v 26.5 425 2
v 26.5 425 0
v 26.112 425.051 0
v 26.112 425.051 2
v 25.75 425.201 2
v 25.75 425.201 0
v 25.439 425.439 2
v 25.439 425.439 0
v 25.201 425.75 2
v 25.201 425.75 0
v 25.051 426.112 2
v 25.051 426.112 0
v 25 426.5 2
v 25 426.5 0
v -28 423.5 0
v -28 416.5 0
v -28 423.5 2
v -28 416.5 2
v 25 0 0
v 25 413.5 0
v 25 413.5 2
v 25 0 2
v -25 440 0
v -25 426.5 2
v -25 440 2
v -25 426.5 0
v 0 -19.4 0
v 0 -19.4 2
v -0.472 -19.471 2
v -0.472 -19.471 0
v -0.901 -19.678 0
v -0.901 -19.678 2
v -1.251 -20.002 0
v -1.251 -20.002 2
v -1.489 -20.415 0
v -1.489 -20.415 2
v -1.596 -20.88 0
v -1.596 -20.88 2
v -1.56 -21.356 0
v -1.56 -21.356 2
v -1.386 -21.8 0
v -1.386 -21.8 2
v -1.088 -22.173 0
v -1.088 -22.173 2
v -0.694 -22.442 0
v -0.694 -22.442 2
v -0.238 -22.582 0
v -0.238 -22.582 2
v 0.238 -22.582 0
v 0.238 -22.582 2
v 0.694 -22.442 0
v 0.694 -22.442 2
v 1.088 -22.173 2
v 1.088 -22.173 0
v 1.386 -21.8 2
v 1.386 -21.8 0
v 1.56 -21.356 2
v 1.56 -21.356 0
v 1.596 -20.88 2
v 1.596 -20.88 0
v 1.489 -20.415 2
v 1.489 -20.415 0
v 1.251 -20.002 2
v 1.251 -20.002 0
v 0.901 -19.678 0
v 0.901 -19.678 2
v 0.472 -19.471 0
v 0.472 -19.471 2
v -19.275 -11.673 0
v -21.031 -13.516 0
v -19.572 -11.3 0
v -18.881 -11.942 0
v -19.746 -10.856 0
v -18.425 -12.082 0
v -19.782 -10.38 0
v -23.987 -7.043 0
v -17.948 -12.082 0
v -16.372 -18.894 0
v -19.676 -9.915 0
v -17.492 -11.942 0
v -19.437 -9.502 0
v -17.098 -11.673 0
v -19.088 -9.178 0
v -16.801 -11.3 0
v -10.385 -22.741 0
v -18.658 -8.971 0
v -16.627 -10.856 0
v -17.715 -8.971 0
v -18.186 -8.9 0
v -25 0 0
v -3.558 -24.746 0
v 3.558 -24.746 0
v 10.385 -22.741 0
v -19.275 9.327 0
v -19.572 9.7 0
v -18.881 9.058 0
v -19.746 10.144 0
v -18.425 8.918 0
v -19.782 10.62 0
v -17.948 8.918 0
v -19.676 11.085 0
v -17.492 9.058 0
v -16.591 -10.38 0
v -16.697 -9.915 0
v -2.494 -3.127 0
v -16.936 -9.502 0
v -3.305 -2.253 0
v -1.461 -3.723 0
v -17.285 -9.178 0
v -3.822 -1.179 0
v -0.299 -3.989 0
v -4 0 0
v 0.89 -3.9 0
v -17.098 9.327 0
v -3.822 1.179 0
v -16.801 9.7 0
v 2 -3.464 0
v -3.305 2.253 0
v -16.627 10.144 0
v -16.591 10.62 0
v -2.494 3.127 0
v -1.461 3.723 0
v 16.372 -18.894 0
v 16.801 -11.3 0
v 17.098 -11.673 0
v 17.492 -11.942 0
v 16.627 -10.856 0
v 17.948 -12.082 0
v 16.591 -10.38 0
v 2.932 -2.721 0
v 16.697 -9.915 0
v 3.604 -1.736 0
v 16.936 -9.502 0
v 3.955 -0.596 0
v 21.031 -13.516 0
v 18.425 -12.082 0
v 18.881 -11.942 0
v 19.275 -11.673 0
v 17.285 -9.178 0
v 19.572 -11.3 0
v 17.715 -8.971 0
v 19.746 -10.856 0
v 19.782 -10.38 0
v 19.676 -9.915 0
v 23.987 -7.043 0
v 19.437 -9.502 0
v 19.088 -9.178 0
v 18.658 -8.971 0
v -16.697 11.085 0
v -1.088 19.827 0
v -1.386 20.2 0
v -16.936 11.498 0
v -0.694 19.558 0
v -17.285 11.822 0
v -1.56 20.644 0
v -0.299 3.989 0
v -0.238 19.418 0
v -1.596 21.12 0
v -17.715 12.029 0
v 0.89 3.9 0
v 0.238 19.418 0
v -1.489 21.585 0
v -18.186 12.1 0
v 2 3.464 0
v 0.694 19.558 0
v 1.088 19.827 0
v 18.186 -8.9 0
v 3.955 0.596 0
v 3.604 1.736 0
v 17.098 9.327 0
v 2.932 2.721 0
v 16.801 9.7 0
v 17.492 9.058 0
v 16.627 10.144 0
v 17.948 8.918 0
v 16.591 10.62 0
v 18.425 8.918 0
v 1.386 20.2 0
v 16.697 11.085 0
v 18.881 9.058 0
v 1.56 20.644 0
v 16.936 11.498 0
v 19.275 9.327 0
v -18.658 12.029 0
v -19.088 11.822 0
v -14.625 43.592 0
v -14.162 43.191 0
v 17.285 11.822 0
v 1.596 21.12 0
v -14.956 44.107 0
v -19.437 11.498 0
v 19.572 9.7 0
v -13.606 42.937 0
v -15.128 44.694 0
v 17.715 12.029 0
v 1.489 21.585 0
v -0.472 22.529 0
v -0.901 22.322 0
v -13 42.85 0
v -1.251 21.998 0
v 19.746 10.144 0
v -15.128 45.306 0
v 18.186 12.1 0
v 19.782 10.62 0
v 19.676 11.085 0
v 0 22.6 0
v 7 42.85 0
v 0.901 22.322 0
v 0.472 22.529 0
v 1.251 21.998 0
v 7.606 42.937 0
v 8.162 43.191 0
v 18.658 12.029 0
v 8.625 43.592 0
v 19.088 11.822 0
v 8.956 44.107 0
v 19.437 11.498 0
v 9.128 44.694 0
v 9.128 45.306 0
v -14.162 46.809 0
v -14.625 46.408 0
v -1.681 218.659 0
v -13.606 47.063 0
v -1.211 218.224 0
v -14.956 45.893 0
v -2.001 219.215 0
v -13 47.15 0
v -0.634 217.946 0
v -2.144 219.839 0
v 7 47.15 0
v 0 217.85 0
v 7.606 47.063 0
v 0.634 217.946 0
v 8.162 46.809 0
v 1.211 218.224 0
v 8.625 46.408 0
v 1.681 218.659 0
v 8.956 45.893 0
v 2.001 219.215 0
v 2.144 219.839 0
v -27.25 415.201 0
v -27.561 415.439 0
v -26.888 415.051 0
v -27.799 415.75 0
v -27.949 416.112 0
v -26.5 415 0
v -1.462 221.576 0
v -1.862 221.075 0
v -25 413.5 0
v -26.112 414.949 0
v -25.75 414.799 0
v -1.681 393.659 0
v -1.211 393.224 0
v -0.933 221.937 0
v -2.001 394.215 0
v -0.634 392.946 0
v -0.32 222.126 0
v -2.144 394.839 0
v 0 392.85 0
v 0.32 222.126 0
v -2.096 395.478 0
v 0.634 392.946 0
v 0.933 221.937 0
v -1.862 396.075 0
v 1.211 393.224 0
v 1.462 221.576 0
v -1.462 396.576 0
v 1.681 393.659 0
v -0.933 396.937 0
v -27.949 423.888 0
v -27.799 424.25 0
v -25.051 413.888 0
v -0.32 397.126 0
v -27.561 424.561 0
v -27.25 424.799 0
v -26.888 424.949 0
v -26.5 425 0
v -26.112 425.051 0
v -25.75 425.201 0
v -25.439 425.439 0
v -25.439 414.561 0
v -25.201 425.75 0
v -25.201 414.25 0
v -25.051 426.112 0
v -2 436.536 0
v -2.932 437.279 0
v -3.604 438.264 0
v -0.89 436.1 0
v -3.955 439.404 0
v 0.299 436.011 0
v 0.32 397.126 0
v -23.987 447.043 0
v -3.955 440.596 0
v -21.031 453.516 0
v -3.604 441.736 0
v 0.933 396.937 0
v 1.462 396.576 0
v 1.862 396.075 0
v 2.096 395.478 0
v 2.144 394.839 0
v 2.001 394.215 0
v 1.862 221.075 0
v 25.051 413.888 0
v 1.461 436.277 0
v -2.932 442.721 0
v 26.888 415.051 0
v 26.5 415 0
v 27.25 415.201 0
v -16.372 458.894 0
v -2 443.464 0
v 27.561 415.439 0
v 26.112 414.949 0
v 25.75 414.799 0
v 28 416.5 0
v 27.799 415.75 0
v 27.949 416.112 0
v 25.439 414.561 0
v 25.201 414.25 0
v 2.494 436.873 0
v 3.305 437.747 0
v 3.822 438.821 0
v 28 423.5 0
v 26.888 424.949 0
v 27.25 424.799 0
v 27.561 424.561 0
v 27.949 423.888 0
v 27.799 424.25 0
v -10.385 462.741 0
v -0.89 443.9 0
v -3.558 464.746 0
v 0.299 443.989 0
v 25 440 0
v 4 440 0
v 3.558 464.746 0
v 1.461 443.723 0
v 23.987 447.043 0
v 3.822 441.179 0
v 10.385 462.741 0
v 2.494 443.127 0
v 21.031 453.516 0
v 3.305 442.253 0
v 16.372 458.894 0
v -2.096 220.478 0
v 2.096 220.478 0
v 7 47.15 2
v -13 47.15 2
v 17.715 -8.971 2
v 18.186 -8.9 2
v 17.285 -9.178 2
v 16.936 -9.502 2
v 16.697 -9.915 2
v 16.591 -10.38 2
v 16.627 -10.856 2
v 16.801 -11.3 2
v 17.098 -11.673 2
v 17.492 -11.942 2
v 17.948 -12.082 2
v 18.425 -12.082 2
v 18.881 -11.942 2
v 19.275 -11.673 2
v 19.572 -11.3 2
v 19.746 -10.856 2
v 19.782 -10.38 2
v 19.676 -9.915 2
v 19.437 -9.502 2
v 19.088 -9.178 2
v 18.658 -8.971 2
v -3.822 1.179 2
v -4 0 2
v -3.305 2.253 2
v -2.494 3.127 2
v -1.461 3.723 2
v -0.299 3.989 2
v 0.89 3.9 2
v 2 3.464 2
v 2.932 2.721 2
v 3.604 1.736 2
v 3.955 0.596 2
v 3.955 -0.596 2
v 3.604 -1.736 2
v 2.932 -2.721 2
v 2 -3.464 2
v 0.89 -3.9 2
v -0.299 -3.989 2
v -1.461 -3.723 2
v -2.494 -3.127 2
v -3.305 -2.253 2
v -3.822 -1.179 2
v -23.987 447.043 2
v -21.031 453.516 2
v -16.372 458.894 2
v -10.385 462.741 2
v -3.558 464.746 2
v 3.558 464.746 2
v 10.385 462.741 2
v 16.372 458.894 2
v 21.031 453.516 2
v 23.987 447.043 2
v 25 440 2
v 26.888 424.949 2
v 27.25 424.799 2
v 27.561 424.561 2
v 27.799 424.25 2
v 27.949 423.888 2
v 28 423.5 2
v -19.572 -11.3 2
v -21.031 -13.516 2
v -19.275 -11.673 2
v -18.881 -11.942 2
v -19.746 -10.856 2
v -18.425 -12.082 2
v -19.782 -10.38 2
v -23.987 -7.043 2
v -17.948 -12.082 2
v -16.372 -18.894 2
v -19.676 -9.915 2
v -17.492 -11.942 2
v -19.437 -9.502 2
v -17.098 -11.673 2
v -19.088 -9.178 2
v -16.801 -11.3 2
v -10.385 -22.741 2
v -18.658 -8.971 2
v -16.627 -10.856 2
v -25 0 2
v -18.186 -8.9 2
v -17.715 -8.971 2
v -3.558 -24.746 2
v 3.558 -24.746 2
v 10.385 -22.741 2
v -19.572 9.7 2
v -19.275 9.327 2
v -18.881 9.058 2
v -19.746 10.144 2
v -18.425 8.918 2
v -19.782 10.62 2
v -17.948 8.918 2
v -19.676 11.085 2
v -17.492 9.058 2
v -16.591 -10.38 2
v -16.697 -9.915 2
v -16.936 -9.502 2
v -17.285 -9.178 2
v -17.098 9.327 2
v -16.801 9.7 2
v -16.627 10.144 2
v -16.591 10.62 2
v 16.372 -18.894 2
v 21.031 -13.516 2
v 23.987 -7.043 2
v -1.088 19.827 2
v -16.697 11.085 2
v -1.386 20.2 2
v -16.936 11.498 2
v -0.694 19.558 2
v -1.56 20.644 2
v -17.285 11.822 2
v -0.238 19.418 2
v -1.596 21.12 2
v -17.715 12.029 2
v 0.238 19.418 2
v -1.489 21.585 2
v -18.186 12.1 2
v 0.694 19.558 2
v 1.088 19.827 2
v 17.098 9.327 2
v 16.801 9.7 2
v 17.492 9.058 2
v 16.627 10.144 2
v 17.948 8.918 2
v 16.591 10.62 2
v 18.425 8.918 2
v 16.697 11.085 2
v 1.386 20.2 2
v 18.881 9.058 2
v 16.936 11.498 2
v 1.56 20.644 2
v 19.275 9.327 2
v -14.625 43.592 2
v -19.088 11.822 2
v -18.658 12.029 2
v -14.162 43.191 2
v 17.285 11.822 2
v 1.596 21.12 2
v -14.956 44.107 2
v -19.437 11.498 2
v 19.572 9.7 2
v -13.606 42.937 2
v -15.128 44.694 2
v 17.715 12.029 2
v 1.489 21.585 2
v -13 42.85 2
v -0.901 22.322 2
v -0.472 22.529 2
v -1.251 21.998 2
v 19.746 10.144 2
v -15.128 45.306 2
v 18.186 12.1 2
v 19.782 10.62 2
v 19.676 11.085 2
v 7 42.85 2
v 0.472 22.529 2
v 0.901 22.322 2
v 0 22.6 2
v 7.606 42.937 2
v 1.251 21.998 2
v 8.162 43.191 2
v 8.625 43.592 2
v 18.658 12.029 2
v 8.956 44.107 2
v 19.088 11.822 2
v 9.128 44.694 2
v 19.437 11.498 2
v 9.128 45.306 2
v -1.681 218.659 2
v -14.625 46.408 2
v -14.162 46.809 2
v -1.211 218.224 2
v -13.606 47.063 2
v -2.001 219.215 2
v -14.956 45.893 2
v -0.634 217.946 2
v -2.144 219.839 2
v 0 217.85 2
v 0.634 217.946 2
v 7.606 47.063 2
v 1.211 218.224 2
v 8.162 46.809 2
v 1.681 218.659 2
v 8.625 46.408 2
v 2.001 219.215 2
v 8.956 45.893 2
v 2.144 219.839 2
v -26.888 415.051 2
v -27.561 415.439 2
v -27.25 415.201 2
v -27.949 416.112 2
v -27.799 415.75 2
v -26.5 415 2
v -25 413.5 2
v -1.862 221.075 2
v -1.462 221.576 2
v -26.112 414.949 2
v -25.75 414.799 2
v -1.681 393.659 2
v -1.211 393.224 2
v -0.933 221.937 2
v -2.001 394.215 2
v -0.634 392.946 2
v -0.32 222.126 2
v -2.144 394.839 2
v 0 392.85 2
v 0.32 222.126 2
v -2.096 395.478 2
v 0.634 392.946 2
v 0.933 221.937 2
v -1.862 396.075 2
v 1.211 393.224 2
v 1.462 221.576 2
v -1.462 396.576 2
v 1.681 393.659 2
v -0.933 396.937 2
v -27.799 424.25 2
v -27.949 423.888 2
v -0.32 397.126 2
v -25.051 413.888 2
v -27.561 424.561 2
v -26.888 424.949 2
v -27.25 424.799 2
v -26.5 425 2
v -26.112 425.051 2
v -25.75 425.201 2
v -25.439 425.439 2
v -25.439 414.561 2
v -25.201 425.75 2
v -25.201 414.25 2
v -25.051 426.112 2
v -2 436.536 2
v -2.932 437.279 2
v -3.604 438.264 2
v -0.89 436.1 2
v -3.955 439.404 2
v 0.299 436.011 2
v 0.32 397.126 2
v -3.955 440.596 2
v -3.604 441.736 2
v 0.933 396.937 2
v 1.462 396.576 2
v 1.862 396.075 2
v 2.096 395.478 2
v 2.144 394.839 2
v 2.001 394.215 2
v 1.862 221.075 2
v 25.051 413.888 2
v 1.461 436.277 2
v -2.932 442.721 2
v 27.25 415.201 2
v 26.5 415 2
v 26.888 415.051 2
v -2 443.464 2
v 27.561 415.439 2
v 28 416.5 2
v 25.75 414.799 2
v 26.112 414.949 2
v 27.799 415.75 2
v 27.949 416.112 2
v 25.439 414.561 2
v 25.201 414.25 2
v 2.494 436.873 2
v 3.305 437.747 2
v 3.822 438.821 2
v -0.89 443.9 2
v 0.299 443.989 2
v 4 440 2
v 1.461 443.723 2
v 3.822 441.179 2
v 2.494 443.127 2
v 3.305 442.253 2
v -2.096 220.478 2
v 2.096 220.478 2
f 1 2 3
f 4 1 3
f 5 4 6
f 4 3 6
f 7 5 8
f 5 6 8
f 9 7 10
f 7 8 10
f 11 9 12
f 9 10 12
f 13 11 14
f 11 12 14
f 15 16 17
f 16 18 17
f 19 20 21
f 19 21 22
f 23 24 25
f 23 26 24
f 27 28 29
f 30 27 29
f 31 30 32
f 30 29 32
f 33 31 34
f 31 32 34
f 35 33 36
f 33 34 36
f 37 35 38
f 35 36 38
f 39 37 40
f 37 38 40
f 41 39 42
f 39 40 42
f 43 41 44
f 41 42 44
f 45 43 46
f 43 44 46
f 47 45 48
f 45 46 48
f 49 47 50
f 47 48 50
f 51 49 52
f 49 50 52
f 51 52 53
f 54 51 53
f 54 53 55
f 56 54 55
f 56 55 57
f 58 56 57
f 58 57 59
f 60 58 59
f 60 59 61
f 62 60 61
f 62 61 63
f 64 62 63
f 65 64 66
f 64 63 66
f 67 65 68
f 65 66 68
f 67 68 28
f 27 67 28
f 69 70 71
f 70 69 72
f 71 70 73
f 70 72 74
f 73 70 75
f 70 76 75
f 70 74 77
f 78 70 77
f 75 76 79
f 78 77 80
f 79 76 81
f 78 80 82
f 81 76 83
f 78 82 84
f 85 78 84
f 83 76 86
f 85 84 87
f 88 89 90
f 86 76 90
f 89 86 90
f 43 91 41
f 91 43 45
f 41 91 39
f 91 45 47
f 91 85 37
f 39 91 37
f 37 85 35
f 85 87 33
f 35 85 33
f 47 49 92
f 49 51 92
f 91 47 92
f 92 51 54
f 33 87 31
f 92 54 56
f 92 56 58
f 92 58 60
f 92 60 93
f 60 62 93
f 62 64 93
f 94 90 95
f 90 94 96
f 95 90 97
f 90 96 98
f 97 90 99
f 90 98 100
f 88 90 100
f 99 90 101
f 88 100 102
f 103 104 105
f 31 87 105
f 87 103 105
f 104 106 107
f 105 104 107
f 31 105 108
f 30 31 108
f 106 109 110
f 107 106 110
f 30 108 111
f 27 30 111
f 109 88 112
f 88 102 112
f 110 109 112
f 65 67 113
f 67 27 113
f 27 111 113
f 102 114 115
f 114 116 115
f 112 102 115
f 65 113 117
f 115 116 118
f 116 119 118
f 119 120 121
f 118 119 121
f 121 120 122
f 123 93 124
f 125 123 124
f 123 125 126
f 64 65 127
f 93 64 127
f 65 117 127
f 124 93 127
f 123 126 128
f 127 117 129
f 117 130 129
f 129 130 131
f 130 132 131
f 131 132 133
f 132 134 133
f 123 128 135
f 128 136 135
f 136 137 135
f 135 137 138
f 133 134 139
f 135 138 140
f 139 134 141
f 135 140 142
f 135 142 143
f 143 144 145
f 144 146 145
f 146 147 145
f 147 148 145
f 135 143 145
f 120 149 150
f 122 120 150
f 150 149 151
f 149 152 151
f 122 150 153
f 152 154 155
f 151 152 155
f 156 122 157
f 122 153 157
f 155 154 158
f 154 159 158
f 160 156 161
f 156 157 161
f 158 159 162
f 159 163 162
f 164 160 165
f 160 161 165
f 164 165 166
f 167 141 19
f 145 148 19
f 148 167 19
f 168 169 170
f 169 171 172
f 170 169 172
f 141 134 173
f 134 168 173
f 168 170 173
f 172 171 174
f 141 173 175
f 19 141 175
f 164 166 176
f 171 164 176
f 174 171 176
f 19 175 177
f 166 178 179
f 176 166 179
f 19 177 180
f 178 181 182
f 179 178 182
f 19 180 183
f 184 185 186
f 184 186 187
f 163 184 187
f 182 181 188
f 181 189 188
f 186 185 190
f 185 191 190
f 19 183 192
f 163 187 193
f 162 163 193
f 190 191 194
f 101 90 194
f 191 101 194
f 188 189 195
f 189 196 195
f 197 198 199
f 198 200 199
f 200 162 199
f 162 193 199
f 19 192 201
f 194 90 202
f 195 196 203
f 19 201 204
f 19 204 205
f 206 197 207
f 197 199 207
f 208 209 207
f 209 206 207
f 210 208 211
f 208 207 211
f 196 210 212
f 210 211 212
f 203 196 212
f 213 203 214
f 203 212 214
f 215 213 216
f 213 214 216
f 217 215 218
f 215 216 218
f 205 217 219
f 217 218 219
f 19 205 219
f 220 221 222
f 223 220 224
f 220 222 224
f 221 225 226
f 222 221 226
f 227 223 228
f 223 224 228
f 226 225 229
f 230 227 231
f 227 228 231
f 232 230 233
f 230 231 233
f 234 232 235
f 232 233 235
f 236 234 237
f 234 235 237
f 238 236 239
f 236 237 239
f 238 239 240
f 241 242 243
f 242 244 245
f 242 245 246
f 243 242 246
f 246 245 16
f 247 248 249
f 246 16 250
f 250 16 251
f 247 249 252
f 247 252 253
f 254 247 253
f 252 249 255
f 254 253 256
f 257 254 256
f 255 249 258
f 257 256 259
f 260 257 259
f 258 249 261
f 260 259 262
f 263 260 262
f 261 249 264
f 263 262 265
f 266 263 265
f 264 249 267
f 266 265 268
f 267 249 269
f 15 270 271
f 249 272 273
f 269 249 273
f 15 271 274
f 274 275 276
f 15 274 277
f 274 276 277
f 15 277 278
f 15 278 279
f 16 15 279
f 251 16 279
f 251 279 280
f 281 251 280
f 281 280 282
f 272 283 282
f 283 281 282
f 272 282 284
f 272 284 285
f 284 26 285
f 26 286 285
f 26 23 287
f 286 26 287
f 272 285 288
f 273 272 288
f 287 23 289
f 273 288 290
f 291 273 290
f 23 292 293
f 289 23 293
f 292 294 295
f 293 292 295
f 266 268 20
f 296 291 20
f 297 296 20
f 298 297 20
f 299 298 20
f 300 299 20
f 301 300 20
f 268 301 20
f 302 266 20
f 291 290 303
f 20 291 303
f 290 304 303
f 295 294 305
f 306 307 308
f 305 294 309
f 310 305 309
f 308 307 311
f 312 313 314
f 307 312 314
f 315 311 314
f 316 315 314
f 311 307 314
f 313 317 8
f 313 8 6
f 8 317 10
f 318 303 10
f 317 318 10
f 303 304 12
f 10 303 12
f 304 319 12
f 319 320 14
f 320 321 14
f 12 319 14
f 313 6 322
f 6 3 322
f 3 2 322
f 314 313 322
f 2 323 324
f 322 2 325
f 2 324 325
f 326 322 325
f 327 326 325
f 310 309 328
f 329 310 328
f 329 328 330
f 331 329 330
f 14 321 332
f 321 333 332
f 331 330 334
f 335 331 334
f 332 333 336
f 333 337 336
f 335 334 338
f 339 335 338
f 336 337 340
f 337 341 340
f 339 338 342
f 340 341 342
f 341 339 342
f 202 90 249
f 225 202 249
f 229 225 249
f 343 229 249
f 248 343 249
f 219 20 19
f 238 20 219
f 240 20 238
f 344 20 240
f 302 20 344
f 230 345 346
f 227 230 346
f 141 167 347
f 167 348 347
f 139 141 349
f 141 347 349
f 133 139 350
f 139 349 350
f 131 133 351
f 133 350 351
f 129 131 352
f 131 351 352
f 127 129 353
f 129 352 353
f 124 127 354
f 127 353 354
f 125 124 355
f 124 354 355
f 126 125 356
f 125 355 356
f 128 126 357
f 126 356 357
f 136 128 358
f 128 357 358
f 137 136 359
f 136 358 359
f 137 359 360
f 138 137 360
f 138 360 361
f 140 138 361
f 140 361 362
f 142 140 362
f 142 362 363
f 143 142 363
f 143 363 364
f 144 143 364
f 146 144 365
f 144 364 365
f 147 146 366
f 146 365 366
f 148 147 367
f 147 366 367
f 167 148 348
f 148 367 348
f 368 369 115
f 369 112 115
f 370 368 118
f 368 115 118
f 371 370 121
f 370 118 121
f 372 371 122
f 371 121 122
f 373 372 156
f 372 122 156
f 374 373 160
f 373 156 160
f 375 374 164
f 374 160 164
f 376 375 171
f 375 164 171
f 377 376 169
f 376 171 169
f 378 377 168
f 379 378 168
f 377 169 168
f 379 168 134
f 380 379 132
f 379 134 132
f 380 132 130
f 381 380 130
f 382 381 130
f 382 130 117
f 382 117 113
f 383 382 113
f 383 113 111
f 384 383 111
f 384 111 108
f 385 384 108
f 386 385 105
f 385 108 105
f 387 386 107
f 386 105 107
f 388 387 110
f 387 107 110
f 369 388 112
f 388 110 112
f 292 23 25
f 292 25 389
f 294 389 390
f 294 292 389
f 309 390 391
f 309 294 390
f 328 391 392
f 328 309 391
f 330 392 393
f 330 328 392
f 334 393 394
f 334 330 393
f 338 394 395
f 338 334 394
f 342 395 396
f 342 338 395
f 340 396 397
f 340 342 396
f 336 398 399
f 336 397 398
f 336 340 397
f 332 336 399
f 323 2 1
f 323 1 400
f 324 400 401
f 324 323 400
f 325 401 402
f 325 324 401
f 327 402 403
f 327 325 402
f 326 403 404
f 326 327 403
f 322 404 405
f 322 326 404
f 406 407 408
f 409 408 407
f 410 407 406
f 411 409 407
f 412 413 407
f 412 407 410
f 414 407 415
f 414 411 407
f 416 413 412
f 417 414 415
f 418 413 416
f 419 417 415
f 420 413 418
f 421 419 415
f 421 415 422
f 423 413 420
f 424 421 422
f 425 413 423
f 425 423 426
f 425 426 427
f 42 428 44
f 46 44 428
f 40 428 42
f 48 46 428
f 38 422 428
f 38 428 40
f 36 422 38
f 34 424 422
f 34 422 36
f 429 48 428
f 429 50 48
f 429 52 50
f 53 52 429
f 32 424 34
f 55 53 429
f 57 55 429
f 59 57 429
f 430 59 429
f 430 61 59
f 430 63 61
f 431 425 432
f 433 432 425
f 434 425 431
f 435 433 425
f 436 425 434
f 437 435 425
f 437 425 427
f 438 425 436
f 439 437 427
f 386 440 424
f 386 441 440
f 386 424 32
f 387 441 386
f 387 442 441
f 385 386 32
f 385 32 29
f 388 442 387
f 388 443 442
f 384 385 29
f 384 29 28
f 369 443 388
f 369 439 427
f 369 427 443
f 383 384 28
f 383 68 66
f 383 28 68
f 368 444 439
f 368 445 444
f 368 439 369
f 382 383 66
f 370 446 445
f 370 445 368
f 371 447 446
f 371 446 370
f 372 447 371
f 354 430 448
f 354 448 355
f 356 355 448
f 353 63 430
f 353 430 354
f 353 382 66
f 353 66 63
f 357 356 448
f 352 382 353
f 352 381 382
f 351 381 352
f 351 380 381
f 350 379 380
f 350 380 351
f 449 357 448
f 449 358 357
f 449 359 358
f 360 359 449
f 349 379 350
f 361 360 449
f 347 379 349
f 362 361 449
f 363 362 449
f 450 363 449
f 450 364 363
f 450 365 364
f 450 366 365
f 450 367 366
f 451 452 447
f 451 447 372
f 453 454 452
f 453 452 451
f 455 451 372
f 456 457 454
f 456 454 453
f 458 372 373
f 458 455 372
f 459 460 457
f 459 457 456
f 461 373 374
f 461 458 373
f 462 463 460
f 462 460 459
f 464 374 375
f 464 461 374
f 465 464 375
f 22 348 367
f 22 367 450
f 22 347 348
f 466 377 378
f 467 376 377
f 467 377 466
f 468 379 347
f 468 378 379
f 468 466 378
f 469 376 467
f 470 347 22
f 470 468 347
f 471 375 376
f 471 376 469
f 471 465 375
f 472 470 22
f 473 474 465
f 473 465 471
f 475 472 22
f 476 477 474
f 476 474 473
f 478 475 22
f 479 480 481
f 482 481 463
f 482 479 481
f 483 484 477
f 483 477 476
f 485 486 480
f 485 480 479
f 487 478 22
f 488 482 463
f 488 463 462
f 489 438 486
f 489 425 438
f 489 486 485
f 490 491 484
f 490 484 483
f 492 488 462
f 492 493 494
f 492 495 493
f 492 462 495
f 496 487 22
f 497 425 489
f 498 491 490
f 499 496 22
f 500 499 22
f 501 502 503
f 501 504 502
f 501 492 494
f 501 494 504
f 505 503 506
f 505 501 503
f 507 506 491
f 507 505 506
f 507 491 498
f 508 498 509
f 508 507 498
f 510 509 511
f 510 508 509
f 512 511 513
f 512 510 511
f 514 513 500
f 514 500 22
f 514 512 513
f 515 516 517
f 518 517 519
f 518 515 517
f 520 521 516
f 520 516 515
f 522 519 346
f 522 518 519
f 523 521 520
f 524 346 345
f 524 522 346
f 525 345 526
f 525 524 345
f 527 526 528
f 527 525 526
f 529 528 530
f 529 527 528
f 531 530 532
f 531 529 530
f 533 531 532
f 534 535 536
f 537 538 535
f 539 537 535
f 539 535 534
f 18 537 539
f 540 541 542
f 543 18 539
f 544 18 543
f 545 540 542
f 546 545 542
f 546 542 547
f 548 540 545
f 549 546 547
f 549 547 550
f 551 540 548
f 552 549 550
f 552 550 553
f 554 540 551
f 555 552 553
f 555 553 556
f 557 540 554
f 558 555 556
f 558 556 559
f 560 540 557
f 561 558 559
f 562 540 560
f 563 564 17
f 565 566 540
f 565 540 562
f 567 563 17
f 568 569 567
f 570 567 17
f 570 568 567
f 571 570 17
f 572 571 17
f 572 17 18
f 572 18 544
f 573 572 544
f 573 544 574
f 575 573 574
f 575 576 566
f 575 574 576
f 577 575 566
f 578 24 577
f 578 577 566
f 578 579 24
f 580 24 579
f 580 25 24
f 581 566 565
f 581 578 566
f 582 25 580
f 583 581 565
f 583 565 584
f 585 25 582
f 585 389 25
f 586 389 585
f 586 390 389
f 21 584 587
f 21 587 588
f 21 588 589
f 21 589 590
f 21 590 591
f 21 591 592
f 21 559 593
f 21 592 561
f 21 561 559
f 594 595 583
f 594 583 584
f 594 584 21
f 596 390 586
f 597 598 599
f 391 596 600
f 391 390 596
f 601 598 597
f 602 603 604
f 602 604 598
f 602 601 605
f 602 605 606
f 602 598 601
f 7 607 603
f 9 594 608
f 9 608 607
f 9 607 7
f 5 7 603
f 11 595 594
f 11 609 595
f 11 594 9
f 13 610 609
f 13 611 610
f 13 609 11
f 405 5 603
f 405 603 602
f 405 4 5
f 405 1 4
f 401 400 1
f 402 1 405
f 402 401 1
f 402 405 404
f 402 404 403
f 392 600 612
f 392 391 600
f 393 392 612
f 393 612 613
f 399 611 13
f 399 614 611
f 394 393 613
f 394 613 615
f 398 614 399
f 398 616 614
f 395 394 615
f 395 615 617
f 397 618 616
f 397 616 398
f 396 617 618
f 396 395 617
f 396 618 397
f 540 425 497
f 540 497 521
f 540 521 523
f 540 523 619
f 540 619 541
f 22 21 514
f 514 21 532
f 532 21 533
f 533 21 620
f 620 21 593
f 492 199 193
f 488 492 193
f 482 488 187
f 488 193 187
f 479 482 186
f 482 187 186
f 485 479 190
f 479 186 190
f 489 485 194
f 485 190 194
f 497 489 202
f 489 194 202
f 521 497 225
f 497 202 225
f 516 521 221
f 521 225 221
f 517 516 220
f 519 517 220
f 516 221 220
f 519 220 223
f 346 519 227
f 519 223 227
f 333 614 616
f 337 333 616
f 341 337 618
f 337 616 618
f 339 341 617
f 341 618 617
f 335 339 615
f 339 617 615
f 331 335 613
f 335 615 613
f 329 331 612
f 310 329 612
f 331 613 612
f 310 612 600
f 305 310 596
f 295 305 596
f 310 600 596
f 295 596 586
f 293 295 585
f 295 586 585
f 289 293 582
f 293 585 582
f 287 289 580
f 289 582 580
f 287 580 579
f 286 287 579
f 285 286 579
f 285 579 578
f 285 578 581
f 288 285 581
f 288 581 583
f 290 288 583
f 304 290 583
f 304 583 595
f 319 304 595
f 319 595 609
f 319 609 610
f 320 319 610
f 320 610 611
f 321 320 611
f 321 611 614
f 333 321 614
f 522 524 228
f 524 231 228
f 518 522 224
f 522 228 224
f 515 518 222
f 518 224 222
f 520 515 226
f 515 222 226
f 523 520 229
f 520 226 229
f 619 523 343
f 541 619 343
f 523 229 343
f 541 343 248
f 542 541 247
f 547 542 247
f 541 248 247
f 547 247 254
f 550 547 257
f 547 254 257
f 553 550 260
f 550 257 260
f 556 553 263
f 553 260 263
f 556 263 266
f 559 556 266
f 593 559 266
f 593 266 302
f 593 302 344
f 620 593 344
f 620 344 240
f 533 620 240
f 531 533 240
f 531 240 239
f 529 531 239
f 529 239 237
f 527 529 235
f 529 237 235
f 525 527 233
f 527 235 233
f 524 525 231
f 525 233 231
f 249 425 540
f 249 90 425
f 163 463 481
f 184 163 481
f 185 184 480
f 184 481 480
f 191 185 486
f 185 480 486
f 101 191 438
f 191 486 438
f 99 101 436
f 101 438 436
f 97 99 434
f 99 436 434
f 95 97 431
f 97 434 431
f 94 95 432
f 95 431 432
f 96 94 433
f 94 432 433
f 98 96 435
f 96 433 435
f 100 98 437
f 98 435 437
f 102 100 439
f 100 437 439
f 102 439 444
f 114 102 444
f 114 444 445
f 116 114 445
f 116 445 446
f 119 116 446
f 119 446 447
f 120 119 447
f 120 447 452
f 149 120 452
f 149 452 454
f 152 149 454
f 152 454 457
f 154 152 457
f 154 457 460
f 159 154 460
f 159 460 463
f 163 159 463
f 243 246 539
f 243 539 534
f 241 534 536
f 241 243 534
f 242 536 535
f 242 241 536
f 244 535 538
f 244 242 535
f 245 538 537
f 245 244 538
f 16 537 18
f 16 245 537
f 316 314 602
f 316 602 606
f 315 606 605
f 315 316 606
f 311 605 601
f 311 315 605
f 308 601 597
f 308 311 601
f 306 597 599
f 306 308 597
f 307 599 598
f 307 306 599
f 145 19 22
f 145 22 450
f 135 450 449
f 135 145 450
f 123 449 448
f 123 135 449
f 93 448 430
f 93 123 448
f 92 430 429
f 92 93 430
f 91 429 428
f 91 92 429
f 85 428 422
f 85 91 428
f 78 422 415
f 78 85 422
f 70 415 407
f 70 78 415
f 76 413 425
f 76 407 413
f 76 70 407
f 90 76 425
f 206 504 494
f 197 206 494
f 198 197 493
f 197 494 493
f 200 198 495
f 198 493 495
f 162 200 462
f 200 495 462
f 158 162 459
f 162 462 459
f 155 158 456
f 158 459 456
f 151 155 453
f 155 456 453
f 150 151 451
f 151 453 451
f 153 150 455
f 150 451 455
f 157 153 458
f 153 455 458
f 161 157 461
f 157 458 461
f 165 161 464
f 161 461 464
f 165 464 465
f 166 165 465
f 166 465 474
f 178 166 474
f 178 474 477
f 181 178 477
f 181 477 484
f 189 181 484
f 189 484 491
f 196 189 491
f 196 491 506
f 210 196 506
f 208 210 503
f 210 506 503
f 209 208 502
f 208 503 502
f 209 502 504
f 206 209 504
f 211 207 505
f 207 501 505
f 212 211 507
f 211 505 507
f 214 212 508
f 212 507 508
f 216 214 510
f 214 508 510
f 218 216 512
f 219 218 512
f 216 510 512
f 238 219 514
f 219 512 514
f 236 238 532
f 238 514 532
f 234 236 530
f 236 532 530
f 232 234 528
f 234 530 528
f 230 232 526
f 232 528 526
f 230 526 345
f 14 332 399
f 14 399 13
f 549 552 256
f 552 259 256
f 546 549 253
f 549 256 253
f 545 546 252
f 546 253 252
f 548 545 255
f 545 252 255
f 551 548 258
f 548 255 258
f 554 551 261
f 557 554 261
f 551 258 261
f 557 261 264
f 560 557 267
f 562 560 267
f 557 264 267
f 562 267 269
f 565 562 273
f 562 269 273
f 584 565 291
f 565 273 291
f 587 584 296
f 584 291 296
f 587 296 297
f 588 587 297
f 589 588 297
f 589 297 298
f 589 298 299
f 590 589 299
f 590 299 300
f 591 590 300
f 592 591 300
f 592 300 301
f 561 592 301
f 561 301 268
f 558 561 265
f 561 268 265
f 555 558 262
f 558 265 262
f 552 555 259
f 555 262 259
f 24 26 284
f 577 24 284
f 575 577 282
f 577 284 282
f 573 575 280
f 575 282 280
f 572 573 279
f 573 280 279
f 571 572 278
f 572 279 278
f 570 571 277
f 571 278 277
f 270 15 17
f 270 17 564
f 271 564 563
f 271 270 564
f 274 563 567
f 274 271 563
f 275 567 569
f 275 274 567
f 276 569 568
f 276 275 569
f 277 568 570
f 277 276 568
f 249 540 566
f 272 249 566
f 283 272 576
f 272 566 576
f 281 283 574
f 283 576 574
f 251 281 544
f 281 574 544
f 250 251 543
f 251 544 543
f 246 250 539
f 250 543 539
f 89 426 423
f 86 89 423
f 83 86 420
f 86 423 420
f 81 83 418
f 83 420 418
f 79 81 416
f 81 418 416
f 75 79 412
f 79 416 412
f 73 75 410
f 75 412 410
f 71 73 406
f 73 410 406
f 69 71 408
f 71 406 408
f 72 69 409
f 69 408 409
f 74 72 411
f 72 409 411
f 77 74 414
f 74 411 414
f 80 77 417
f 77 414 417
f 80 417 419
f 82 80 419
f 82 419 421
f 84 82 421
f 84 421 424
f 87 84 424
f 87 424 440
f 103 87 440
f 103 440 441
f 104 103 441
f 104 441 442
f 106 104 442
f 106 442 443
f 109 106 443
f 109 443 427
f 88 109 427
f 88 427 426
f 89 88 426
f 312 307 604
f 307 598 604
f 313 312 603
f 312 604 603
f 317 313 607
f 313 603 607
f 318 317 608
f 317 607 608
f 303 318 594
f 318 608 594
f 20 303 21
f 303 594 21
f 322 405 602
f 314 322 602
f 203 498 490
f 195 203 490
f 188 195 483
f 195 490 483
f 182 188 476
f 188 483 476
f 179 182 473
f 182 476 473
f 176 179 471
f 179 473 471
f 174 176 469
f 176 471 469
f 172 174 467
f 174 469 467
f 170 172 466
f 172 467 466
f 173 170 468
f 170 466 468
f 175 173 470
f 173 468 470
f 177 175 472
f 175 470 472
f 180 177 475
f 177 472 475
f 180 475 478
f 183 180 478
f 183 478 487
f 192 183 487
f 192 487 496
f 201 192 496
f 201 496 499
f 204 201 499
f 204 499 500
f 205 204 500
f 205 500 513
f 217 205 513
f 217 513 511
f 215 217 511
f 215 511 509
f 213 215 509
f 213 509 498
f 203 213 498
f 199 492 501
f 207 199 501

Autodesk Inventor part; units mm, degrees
ref_plane "YZ Plane" through (0, 0, 0) normal (1, 0, 0) x (0, 1, 0)
ref_plane "XZ Plane" through (0, 0, 0) normal (0, 1, 0) x (-1, 0, 0)
ref_plane "XY Plane" through (0, 0, 0) normal (0, 0, 1) x (1, 0, 0)
sketch "スケッチ1" plane through (0, 0, 0) normal (0, 0, 1) x (1, 0, 0)
  circle A0 centre (0, 0) radius 25
  circle A1 centre (0, 440) radius 25
  line L0 (-25, 0) -> (-25, 440)
  line L1 (25, 440) -> (25, 0)
  dimension "d0" = 50
  dimension "d1" = 50
  dimension "d2" = 440
extrude "プレート1" add sketch "スケッチ1" along normal blind 2
sketch "スケッチ4" plane through (0, 0, 0) normal (0, 0, -1) x (-1, 0, 0)
  circle A0 centre (0, 0) radius 4
  dimension "d28" = 8
extrude "押し出し1" cut sketch "スケッチ4" against normal blind 10
sketch "スケッチ5" plane through (0, 0, 0) normal (0, 0, -1) x (-1, 0, 0)
  circle A0 centre (0, 0) radius 21
  point P0 (0, 21)
  point P1 (-18.1865, 10.5)
  point P2 (-18.1865, -10.5)
  point P3 (0, -21)
  point P4 (18.1865, -10.5)
  point P5 (18.1865, 10.5)
  dimension "d31" = 42
  dimension "d34" = 360
hole "穴3" at (0, 21, 0) at (18.1865, 10.5, 0) at (18.1865, -10.5, 0) at (0, -21, 0) at (-18.1865, -10.5, 0) at (-18.1865, 10.5, 0) direction (0, 0, 1) diameter 3.2 end through all clearance for "Flat Head Machine Screw" size "M3" standard "Ansi Metric M Profile"
sketch "スケッチ6" plane through (0, 0, 2) normal (0, 0, 1) x (1, 0, 0)
  arc A0 (25, 440) -> (-25, 440) centre (0, 440) ccw projected
  circle A1 centre (0, 440) radius 4
  point P0 (0, 0)
  dimension "d43" = 8
extrude "押し出し2" cut sketch "スケッチ6" against normal blind 10
sketch "スケッチ8" plane through (0, 0, 2) normal (0, 0, 1) x (1, 0, 0)
  arc A0 (25, 440) -> (-25, 440) centre (0, 440) ccw projected
  point P0 (0, 0)
  point P1 (-13, 45)
  point P2 (0, 395)
  point P3 (0, 220)
  dimension "d54" = 45
  dimension "d55" = 220
  dimension "d71" = 45
  dimension "d72" = 13
hole "穴4" at (-13, 45, 2) at (0, 395, 2) at (0, 220, 2) direction (0, 0, -1) diameter 4.3 end through all clearance for "Flat Head Machine Screw" size "M4" standard "Ansi Metric M Profile"
sketch "スケッチ10" plane through (0, 0, 2) normal (0, 0, 1) x (1, 0, 0)
  circle A0 centre (7, 45) radius 2.15
  line L0 (7, 45) -> (-13, 45) construction
  line L1 (7, 47.15) -> (-13, 47.15)
  line L2 (-13, 42.85) -> (7, 42.85)
  arc A1 (7, 42.85) -> (7, 47.15) centre (7, 45) ccw
  arc A2 (-13, 47.15) -> (-13, 42.85) centre (-13, 45) ccw
  circle A3 centre (-13, 45) radius 2.15 projected
  point P0 (0, 0)
  point P1 (-3, 45)
  point P2 (7, 47.15)
  point P3 (7, 42.85)
  dimension "d68" = 20
extrude "押し出し3" cut sketch "スケッチ10" against normal blind 10
sketch "スケッチ11" plane through (0, 0, 2) normal (0, 0, 1) x (1, 0, 0)
  circle A0 centre (25, 420) radius 3
  line L0 (25, 440) -> (25, 0) projected
  circle A1 centre (0, 440) radius 4 projected
  line L1 (22, 425) -> (28, 425)
  line L2 (28, 425) -> (28, 415)
  line L3 (28, 415) -> (22, 415)
  line L4 (22, 415) -> (22, 425)
  line L5 (22, 425) -> (28, 415) construction
  line L6 (28, 425) -> (22, 415) construction
  point P0 (0, 0)
  point P1 (25, 423)
  point P2 (25, 417)
  point P3 (28, 420)
  dimension "d73" = 6
  dimension "d74" = 0
  dimension "d75" = 20
  dimension "d79" = 10
extrude "押し出し4" add sketch "スケッチ11" against normal up to surface (2 mm away) contours A0 L0 | L2 L3 L0 A0 | A0 L0 L1 L2 | L0 A0 | A0 L4 L1 L0 | L0 L3 L4 A0
fillet "コーナーR1" radius 1.5 4 edges at (25, 425, 1) (28, 425, 1) (28, 415, 1) (25, 415, 1)
mirror "ミラー1" about plane through (0, 0, 0) normal (1, 0, 0) of "押し出し4", "コーナーR1"
fillet_without_effect "コーナーR2"
equation "\"d41\" = Thickness"
equation "\"d3\" = Thickness"
equation "\"BendRadius\" = Thickness"
equation "\"BendReliefWidth\" = Thickness"
equation "\"BendReliefDepth\" = 0.5 * Thickness"
equation "\"CornerReliefSize\" = 4 * Thickness"
equation "\"MinimumRemnant\" = 2 * Thickness"
equation "\"TransitionRadius\" = BendRadius"
equation "\"JacobiRadiusSize\" = Thickness"
equation "\"GapSize\" = Thickness"
equation "\"Thickness\" = 2"
properties part number "link3-plate1" material "CFRP"
